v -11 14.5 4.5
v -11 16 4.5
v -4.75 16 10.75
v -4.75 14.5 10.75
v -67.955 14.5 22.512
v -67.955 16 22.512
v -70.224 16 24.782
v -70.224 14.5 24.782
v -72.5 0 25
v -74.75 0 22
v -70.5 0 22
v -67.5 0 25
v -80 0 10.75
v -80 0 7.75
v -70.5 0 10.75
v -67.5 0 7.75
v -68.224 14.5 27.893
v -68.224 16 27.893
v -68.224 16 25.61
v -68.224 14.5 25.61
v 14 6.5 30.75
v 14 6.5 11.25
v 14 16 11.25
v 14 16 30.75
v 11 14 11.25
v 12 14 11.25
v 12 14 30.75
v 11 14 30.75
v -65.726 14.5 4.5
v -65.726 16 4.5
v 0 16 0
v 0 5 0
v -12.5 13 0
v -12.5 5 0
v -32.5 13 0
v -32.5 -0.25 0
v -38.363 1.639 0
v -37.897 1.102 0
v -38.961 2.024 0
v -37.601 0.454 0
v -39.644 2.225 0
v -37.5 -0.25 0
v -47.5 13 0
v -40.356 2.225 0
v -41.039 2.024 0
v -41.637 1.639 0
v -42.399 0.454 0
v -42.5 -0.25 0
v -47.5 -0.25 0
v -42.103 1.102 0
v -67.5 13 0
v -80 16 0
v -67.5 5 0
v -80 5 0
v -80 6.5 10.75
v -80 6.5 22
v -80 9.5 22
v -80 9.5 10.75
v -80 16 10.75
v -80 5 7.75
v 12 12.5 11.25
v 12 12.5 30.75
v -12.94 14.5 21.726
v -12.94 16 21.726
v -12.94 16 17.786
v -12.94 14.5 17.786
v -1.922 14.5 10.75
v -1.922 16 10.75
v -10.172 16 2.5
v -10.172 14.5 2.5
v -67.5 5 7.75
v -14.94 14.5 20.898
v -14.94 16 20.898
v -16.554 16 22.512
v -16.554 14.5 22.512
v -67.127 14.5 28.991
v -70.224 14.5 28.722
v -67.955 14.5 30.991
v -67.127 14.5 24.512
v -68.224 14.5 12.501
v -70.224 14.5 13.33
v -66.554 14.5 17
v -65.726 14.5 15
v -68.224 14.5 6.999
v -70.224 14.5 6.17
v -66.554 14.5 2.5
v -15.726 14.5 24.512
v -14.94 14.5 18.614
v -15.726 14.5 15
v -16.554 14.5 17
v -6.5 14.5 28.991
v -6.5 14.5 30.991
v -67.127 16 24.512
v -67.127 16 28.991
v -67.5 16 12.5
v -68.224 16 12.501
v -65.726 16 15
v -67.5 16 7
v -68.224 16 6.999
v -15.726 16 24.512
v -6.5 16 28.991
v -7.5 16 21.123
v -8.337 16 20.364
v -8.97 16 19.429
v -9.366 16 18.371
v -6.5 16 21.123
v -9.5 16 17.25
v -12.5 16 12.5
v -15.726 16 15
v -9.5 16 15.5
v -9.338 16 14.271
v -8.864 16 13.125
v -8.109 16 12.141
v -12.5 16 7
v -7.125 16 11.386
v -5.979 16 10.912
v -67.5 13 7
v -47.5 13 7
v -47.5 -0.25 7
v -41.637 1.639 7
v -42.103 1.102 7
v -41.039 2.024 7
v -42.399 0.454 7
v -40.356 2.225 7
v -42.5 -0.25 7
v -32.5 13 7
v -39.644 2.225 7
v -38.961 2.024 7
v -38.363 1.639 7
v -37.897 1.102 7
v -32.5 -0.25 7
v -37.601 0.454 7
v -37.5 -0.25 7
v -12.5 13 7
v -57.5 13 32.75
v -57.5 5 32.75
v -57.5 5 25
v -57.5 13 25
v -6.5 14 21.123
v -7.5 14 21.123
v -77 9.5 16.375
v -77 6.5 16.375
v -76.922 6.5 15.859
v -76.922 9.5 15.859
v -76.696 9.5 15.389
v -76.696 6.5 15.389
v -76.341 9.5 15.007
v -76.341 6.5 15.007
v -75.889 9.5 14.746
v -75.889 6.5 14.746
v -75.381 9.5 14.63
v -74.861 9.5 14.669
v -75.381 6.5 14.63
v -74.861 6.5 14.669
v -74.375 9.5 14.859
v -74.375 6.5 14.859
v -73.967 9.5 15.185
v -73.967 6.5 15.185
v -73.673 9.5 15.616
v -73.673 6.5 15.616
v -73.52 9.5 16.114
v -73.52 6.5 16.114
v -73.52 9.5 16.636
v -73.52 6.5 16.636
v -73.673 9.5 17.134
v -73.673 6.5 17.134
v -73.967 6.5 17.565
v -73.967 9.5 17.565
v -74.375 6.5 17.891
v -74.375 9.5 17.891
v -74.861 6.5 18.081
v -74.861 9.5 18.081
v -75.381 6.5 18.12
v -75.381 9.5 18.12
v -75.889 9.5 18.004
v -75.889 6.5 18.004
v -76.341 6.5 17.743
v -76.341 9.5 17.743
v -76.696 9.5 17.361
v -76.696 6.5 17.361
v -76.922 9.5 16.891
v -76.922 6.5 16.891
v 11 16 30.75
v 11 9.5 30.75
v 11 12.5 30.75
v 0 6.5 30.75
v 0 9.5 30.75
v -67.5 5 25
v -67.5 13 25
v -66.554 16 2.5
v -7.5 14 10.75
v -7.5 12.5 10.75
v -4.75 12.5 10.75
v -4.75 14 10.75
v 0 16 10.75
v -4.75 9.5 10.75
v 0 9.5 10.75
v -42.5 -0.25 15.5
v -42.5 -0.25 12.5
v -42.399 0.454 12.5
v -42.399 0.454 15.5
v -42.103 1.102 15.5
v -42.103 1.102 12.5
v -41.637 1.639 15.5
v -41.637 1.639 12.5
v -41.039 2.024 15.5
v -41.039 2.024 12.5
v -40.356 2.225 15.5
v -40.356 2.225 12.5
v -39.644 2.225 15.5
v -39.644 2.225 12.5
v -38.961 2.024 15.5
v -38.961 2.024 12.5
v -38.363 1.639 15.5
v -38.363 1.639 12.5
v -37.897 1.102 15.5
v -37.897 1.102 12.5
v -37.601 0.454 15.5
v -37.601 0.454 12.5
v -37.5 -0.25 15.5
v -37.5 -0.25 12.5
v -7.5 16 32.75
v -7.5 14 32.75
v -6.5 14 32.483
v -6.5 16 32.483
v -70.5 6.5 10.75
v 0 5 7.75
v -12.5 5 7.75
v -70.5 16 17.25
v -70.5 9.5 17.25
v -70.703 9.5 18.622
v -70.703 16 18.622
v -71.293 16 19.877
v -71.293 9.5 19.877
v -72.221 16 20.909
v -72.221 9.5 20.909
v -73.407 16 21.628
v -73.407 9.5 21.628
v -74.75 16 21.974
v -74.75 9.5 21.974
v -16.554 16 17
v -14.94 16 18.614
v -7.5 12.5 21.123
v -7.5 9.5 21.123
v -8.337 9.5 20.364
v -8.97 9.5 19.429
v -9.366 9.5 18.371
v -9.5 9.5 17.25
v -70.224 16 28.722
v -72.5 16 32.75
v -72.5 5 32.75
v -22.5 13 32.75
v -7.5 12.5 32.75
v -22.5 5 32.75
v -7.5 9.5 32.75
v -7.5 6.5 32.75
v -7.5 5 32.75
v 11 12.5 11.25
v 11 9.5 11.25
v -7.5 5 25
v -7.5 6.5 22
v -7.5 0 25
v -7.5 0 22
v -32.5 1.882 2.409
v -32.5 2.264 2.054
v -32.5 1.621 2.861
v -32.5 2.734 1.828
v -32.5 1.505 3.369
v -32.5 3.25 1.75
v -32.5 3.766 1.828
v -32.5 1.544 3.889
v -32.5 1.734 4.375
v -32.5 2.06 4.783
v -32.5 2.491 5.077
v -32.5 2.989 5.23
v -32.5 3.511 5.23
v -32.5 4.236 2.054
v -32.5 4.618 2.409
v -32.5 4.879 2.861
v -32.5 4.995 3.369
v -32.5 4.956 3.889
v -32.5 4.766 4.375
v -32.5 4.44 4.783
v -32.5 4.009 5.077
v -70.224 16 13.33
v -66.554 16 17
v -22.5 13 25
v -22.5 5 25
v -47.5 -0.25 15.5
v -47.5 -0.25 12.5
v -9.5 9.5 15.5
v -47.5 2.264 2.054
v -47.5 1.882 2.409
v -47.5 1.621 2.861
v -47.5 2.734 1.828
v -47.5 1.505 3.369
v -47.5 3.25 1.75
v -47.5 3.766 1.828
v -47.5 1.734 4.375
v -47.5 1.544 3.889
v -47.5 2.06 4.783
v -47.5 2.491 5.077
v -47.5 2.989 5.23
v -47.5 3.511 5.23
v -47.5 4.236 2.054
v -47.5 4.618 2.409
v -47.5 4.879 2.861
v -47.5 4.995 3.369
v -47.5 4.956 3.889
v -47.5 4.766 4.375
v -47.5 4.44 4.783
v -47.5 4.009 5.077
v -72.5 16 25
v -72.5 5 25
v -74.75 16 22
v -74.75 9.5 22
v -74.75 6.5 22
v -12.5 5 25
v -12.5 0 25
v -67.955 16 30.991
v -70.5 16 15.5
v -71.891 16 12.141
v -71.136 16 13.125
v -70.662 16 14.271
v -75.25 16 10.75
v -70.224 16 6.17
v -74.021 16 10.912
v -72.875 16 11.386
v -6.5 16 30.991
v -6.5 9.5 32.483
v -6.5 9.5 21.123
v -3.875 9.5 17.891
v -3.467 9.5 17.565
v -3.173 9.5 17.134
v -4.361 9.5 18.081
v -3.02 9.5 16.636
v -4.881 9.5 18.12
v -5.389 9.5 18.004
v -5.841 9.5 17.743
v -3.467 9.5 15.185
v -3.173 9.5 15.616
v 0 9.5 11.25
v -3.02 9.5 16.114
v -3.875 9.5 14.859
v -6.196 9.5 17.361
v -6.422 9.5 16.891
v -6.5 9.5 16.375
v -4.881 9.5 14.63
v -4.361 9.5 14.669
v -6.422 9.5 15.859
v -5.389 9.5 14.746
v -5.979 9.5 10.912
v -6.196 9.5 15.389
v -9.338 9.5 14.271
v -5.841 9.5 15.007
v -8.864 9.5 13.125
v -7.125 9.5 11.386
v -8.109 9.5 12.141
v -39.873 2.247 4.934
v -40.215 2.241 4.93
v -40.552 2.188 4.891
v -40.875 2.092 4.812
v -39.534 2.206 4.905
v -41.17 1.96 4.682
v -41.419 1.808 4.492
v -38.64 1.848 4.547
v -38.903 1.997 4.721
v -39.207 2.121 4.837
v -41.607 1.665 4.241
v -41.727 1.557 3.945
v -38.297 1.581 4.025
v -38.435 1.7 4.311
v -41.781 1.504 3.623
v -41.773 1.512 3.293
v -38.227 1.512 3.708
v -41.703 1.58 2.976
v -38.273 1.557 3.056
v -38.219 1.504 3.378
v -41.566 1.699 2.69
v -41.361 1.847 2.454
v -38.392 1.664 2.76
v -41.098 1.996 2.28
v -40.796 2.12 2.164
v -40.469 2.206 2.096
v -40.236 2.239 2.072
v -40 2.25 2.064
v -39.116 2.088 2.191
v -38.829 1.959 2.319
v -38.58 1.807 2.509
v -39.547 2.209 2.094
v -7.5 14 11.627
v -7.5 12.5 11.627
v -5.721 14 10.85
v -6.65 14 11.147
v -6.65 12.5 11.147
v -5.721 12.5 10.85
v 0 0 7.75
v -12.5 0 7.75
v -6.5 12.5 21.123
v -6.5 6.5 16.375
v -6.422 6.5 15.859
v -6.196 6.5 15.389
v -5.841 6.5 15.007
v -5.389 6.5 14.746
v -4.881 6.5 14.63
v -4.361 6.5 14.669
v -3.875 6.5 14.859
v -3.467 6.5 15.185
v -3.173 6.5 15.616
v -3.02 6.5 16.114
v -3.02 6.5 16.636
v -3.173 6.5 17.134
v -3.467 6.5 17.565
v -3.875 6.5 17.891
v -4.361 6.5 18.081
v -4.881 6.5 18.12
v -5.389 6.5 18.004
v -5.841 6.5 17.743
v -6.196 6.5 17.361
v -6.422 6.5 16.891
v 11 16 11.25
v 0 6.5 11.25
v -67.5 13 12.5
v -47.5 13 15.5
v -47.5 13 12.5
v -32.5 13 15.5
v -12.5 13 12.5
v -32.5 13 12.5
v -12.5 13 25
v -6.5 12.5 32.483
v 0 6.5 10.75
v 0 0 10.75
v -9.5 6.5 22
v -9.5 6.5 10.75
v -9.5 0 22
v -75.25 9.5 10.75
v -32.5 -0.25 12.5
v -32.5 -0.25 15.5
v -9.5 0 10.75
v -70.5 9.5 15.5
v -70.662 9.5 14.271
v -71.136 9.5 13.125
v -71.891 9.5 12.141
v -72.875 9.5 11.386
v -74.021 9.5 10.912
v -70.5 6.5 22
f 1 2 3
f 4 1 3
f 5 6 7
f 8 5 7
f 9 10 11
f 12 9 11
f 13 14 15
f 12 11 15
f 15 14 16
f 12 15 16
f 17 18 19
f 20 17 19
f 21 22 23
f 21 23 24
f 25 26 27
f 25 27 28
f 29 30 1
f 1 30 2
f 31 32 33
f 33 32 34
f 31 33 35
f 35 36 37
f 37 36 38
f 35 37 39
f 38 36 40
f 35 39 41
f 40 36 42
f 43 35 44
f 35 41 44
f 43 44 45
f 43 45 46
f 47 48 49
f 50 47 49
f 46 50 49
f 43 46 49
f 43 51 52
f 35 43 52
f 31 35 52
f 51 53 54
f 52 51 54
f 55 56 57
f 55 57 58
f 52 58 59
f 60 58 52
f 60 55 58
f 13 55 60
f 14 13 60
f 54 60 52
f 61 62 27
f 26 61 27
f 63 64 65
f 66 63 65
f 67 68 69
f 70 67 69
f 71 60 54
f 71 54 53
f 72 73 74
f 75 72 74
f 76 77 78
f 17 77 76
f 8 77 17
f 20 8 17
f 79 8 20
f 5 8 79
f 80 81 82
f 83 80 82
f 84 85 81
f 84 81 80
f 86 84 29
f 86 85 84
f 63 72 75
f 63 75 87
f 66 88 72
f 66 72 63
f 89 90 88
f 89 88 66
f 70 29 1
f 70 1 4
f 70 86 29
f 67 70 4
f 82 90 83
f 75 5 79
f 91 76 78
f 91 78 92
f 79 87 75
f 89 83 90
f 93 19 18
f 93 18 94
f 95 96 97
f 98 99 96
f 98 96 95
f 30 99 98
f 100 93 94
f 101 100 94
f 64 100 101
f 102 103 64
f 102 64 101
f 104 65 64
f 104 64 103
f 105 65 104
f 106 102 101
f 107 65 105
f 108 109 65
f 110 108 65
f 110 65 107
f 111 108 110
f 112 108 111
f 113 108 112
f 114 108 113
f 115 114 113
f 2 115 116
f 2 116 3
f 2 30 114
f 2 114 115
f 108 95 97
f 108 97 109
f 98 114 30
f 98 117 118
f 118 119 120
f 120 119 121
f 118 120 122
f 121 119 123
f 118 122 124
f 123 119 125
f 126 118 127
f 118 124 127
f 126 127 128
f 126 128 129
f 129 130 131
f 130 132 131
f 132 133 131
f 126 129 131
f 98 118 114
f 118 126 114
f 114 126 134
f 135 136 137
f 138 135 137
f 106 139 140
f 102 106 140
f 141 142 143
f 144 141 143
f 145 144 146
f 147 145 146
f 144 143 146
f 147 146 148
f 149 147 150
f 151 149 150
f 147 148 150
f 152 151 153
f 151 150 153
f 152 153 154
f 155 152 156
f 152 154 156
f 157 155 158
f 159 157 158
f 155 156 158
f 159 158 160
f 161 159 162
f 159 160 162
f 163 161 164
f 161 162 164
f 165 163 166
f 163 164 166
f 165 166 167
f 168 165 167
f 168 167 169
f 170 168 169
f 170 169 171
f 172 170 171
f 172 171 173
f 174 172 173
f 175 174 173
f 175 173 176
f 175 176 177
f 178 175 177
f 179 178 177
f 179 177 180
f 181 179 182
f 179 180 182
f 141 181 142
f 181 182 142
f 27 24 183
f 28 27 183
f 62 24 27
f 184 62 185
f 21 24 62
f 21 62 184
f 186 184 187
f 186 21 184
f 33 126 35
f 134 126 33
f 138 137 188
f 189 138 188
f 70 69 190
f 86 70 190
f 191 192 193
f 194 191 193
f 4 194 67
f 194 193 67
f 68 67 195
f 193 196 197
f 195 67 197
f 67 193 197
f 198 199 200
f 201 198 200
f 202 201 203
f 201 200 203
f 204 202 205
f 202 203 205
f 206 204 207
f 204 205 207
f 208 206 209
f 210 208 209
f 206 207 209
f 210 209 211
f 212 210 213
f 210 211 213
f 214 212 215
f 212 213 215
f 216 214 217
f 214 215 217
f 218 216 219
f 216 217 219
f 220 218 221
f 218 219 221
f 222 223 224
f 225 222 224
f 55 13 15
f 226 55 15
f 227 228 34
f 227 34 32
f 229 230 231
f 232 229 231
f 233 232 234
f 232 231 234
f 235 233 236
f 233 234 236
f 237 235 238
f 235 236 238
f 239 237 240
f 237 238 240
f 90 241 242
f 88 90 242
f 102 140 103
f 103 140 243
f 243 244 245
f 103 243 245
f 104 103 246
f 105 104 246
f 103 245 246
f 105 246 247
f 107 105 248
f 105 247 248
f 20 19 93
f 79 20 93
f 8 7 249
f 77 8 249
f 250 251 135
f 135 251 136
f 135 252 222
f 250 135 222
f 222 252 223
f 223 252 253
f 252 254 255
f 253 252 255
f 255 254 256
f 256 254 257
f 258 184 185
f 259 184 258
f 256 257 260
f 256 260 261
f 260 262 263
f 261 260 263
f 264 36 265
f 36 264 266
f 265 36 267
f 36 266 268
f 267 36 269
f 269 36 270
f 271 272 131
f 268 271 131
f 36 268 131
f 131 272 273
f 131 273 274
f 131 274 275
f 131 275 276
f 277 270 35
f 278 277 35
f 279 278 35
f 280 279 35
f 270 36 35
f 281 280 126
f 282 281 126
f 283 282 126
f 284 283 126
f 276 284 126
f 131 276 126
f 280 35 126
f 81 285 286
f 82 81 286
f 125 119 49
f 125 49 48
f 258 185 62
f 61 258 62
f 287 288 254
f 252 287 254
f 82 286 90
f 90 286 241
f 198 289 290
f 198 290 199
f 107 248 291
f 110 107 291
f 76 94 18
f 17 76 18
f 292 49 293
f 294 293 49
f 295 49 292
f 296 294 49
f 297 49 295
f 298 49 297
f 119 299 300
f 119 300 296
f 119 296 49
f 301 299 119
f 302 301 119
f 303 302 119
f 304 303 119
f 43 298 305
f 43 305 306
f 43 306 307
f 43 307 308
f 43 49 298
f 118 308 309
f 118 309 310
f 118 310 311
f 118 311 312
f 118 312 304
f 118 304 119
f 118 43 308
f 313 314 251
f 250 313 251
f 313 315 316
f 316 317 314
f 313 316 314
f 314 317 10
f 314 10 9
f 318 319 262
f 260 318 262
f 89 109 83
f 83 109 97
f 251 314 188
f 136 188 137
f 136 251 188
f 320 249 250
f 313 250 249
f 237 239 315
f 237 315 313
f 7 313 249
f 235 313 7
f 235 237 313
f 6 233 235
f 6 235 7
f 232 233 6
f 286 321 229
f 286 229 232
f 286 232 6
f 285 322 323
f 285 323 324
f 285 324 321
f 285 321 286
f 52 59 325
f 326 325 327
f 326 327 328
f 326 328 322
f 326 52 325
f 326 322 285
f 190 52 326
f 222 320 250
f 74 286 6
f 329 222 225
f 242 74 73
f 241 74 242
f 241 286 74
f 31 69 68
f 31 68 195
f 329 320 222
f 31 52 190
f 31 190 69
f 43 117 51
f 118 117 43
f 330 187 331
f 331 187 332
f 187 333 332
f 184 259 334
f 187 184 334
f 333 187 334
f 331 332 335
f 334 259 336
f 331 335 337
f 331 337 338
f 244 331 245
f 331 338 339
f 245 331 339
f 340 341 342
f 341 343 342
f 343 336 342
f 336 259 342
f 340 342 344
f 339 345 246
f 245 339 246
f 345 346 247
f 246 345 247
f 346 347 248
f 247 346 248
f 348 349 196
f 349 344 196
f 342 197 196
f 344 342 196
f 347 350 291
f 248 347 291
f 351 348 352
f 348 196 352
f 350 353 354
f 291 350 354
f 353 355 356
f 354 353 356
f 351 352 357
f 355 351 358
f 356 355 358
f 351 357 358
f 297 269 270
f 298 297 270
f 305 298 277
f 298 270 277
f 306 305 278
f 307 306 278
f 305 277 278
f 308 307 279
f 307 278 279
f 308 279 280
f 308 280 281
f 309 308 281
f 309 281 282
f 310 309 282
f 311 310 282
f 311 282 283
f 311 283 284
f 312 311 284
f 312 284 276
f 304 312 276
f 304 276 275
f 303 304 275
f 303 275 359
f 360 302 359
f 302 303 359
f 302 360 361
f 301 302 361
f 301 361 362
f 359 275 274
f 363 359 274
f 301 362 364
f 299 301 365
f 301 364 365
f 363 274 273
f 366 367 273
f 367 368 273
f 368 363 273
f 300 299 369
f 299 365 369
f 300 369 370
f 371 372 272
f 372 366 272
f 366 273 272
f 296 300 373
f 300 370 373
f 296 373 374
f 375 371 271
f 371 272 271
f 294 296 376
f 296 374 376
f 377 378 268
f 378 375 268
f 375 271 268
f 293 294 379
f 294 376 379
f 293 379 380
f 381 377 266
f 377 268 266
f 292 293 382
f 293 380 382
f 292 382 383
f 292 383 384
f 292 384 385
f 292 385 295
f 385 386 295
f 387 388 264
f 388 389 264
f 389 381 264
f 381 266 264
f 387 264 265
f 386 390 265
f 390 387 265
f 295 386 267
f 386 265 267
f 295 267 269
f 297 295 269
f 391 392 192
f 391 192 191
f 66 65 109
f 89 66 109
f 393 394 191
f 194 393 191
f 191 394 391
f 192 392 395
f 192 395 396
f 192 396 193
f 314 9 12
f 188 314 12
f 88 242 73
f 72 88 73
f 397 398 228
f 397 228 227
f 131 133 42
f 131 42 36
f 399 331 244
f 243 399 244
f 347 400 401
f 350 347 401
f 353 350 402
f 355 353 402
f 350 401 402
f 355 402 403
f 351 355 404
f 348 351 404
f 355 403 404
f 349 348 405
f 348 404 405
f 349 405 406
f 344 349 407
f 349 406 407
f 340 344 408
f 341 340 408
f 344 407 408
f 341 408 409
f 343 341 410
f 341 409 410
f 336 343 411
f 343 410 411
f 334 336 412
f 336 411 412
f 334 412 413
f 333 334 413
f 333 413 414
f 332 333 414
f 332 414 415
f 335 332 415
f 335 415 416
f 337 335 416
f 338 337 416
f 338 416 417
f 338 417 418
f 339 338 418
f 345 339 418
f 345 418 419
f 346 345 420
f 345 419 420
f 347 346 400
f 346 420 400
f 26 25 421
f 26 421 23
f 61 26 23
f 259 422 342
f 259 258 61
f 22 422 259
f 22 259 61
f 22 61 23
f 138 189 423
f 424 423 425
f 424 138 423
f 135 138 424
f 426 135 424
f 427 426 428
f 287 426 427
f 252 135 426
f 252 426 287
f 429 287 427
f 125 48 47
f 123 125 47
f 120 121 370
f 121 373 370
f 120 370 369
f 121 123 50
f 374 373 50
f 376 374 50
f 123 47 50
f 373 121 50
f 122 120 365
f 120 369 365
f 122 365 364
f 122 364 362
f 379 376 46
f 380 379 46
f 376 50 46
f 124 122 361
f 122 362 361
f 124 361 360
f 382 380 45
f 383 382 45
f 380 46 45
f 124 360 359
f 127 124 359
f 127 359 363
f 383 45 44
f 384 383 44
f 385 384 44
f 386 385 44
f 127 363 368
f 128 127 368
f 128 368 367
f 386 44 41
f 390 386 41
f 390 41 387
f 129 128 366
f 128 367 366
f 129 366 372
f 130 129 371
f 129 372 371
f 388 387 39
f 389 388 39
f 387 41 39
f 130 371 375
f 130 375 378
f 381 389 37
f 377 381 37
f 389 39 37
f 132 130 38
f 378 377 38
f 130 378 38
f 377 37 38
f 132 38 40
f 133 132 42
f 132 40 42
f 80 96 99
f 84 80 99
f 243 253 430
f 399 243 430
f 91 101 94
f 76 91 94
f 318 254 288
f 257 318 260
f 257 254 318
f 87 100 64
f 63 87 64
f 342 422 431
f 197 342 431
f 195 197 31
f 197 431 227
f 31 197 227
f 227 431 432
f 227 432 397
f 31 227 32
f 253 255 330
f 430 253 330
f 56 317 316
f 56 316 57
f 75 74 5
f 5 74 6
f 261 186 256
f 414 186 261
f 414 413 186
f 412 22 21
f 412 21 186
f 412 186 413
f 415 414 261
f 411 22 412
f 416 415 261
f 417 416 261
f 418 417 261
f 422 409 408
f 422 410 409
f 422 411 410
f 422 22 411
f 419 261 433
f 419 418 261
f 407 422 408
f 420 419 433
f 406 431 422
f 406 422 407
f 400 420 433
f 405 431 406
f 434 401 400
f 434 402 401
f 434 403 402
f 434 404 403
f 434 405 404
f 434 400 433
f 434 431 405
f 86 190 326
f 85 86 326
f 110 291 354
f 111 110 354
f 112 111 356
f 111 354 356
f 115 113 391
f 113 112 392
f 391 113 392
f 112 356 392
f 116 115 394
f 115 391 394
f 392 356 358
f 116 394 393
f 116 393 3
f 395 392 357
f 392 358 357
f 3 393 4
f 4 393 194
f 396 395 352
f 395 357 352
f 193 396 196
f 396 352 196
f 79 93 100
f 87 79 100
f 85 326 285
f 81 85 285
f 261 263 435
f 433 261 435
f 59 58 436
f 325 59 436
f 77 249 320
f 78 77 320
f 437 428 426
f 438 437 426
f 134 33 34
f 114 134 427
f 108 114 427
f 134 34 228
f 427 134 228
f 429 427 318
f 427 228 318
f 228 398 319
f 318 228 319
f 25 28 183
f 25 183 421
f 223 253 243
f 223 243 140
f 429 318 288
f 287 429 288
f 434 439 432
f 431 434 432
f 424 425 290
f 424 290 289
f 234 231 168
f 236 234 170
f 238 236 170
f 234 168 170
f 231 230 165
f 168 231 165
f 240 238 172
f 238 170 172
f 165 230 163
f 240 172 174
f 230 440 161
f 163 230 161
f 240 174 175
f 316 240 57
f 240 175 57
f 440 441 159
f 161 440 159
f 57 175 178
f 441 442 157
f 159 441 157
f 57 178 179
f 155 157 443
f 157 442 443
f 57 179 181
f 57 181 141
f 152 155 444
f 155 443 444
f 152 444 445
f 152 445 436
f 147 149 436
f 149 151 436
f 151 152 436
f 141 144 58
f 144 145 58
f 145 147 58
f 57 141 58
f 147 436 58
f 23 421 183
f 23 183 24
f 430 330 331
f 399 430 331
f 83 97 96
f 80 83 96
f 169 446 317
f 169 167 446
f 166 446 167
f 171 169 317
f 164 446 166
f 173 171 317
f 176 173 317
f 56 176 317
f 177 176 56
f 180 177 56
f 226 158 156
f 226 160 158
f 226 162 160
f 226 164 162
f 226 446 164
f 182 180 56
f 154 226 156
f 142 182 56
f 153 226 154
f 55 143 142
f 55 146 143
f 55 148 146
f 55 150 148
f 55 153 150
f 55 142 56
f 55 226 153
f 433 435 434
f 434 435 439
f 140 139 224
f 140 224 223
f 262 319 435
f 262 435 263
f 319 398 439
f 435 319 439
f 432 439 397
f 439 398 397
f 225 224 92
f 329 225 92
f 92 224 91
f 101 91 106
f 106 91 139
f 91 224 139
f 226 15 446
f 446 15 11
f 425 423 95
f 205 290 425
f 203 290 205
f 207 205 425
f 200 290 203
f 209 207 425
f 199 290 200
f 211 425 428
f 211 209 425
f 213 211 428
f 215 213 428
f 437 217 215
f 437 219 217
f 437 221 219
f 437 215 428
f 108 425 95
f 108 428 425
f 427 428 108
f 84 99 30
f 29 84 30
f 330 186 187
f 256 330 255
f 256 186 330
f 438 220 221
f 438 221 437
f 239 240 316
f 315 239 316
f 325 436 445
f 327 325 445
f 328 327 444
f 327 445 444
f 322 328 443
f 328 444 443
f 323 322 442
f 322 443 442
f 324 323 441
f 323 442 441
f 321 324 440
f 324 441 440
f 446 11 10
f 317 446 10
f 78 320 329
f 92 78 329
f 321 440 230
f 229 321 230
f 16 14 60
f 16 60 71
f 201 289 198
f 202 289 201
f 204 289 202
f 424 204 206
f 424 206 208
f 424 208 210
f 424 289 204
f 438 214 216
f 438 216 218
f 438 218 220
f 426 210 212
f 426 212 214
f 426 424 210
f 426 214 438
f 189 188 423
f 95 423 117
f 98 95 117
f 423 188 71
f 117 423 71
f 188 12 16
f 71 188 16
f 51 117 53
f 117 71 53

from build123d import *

# Parameters (mm, degrees)
BOSS_EXTRUDE1_DEPTH = 16
SKETCH2_W           = 15
SKETCH2_H           = 7.75
SKETCH2_W_2         = 12.5
CUT_EXTRUDE1_DEPTH  = 5
CUT_EXTRUDE4_DEPTH  = 13
SKETCH6_W           = 55
SKETCH6_H           = 5.5
CUT_EXTRUDE5_DEPTH  = 3
SKETCH7_W           = 15
SKETCH7_H           = 7
SKETCH7_H_2         = 3
BOSS_EXTRUDE2_DEPTH = 13.25
SKETCH8_R           = 2.5
CUT_EXTRUDE6_DEPTH  = 15.5
SKETCH9_R           = 1.75
CUT_EXTRUDE7_DEPTH  = 15
SKETCH11_R          = 1.75
BOSS_EXTRUDE3_DEPTH = 3
SKETCH12_W          = 3
SKETCH12_H          = 19.5
BOSS_EXTRUDE4_DEPTH = 6.5
SKETCH13_W          = 1
SKETCH13_H          = 1.5
SKETCH13_W_2        = 18.5
CUT_EXTRUDE9_DEPTH  = 22
CUT_EXTRUDE10_DEPTH = 1.5


with BuildPart() as part:
    # Sketch1 → Boss-Extrude1 (new body)
    with BuildSketch(Plane(origin=(0, 0, 0), x_dir=(1, 0, 0), z_dir=(0, 1, 0))):
        Polygon((0, 0), (-80, 0), (-80, -7.75), (-80, -10.75), (-70.5, -10.75), (-70.5, -22), (-74.75, -22), (-72.5, -25), (-72.5, -32.75), (-7.5, -32.75), (-7.5, -22), (-9.5, -22), (-9.5, -10.75), (0, -10.75), (0, -7.75), align=None)
    extrude(amount=BOSS_EXTRUDE1_DEPTH)

    # Sketch2 → Cut-Extrude1 (cut)
    with BuildSketch(Plane.XZ):
        with Locations((-65, 28.875)):
            Rectangle(SKETCH2_W, SKETCH2_H)
        with Locations((-73.75, 3.875)):
            Rectangle(SKETCH2_W_2, SKETCH2_H)
        with Locations((-15, 28.875)):
            Rectangle(SKETCH2_W, SKETCH2_H)
        with Locations((-6.25, 3.875)):
            Rectangle(SKETCH2_W_2, SKETCH2_H)
    extrude(amount=-CUT_EXTRUDE1_DEPTH, mode=Mode.SUBTRACT)

    # Sketch5 → Cut-Extrude4 (cut)
    with BuildSketch(Plane.XZ):
        Polygon((-67.5, 25), (-67.5, 7.75), (-67.5, 0), (-12.5, 0), (-12.5, 7.75), (-12.5, 25), (-22.5, 25), (-22.5, 32.75), (-57.5, 32.75), (-57.5, 25), align=None)
    extrude(amount=-CUT_EXTRUDE4_DEPTH, mode=Mode.SUBTRACT)

    # Sketch6 → Cut-Extrude5 (cut)
    with BuildSketch(Plane.XZ.offset(-13)):
        with Locations((-40, 9.75)):
            Rectangle(SKETCH6_W, SKETCH6_H)
    extrude(amount=-CUT_EXTRUDE5_DEPTH, mode=Mode.SUBTRACT)

    # Sketch7 → Boss-Extrude2 (add)
    with BuildSketch(Plane.XZ.offset(-13)):
        with Locations((-40, 3.5)):
            Rectangle(SKETCH7_W, SKETCH7_H)
        with Locations((-40, 14)):
            Rectangle(SKETCH7_W, SKETCH7_H_2)
    extrude(amount=BOSS_EXTRUDE2_DEPTH)

    # Sketch8 → Cut-Extrude6 (cut)
    with BuildSketch(Plane(origin=(0, 0, 0), x_dir=(-1, 0, 0), z_dir=(0, 0, -1))):
        with Locations((40, -0.25)):
            Circle(SKETCH8_R)
    extrude(amount=-CUT_EXTRUDE6_DEPTH, mode=Mode.SUBTRACT)

    # Sketch9 → Cut-Extrude7 (cut)
    with BuildSketch(Plane(origin=(-32.5, 0, 0), x_dir=(0, 0, -1), z_dir=(1, 0, 0))):
        with Locations((-3.5, 3.25)):
            Circle(SKETCH9_R)
    extrude(amount=-CUT_EXTRUDE7_DEPTH, mode=Mode.SUBTRACT)

    # Sketch11 → Boss-Extrude3 (add)
    with BuildSketch(Plane(origin=(0, 6.5, 0), x_dir=(-1, 0, 0), z_dir=(0, -1, 0))):
        Polygon((70.5, -10.75), (70.5, -22), (74.75, -22), (80, -22), (80, -10.75), align=None)
        with Locations((75.25, -16.375)):
            Circle(SKETCH11_R, mode=Mode.SUBTRACT)
        Polygon((7.5, -32.75), (7.5, -22), (9.5, -22), (9.5, -10.75), (0, -10.75), (0, -11.25), (-14, -11.25), (-14, -30.75), (0, -30.75), align=None)
        with Locations((4.75, -16.375)):
            Circle(SKETCH11_R, mode=Mode.SUBTRACT)
    extrude(amount=-BOSS_EXTRUDE3_DEPTH)

    # Sketch12 → Boss-Extrude4 (add)
    with BuildSketch(Plane(origin=(0, 9.5, 0), x_dir=(1, 0, 0), z_dir=(0, 1, 0))):
        with BuildLine():
            ThreePointArc((-75.25, -10.75), (-71.891242789, -12.141242789), (-70.5, -15.5))
            Line((-70.5, -15.5), (-70.5, -10.75))
            Line((-70.5, -10.75), (-75.25, -10.75))
        make_face()
        with BuildLine():
            Line((-74.75, -21.973610907), (-74.75, -22))
            Line((-74.75, -22), (-70.5, -22))
            Line((-70.5, -22), (-70.5, -17.25))
            ThreePointArc((-70.5, -17.25), (-71.718888277, -20.427066257), (-74.75, -21.973610907))
        make_face()
        with Locations((12.5, -21)):
            Rectangle(SKETCH12_W, SKETCH12_H)
        with BuildLine():
            Line((-7.5, -32.75), (-6.5, -32.483333333))
            Line((-6.5, -32.483333333), (-6.5, -21.122983346))
            Line((-6.5, -21.122983346), (-7.5, -21.122983346))
            ThreePointArc((-7.5, -21.122983346), (-8.970485754, -19.429449472), (-9.5, -17.25))
            Line((-9.5, -17.25), (-9.5, -22))
            Line((-9.5, -22), (-7.5, -22))
            Line((-7.5, -22), (-7.5, -32.75))
        make_face()
        with BuildLine():
            ThreePointArc((-9.5, -15.5), (-8.108757211, -12.141242789), (-4.75, -10.75))
            Line((-4.75, -10.75), (-9.5, -10.75))
            Line((-9.5, -10.75), (-9.5, -15.5))
        make_face()
    extrude(amount=BOSS_EXTRUDE4_DEPTH)

    # Sketch13 → Cut-Extrude9 (cut)
    with BuildSketch(Plane.XY.offset(32.75)):
        with Locations((11.5, 13.25)):
            Rectangle(SKETCH13_W, SKETCH13_H)
        with Locations((1.75, 13.25)):
            Rectangle(SKETCH13_W_2, SKETCH13_H)
    extrude(amount=-CUT_EXTRUDE9_DEPTH, mode=Mode.SUBTRACT)

    # Sketch14 → Cut-Extrude10 (cut)
    with BuildSketch(Plane(origin=(0, 16, 0), x_dir=(1, 0, 0), z_dir=(0, 1, 0))):
        Polygon((-4.75, -10.75), (-1.921572875, -10.75), (-10.171572875, -2.5), (-38.36287075, -2.5), (-66.554168625, -2.5), (-70.224250191, -6.170081566), (-70.224250191, -13.329918434), (-66.554168625, -17), (-16.554168625, -17), (-14.939672781, -18.614495844), (-14.939672781, -20.897737763), (-16.554168625, -22.512233607), (-67.954977352, -22.512233607), (-70.224250191, -24.781506445), (-70.224250191, -28.721602613), (-67.954977352, -30.990875451), (-6.5, -30.990875451), (-6.5, -28.990875451), (-67.126550228, -28.990875451), (-68.224250191, -27.893175488), (-68.224250191, -25.60993357), (-67.126550228, -24.512233607), (-15.7257415, -24.512233607), (-12.939672781, -21.726164888), (-12.939672781, -17.786068719), (-15.7257415, -15), (-65.7257415, -15), (-68.224250191, -12.50149131), (-68.224250191, -9.75), (-68.224250191, -6.99850869), (-65.7257415, -4.5), (-38.36287075, -4.5), (-11, -4.5), align=None)
    extrude(amount=-CUT_EXTRUDE10_DEPTH, mode=Mode.SUBTRACT)


solid = part.part
